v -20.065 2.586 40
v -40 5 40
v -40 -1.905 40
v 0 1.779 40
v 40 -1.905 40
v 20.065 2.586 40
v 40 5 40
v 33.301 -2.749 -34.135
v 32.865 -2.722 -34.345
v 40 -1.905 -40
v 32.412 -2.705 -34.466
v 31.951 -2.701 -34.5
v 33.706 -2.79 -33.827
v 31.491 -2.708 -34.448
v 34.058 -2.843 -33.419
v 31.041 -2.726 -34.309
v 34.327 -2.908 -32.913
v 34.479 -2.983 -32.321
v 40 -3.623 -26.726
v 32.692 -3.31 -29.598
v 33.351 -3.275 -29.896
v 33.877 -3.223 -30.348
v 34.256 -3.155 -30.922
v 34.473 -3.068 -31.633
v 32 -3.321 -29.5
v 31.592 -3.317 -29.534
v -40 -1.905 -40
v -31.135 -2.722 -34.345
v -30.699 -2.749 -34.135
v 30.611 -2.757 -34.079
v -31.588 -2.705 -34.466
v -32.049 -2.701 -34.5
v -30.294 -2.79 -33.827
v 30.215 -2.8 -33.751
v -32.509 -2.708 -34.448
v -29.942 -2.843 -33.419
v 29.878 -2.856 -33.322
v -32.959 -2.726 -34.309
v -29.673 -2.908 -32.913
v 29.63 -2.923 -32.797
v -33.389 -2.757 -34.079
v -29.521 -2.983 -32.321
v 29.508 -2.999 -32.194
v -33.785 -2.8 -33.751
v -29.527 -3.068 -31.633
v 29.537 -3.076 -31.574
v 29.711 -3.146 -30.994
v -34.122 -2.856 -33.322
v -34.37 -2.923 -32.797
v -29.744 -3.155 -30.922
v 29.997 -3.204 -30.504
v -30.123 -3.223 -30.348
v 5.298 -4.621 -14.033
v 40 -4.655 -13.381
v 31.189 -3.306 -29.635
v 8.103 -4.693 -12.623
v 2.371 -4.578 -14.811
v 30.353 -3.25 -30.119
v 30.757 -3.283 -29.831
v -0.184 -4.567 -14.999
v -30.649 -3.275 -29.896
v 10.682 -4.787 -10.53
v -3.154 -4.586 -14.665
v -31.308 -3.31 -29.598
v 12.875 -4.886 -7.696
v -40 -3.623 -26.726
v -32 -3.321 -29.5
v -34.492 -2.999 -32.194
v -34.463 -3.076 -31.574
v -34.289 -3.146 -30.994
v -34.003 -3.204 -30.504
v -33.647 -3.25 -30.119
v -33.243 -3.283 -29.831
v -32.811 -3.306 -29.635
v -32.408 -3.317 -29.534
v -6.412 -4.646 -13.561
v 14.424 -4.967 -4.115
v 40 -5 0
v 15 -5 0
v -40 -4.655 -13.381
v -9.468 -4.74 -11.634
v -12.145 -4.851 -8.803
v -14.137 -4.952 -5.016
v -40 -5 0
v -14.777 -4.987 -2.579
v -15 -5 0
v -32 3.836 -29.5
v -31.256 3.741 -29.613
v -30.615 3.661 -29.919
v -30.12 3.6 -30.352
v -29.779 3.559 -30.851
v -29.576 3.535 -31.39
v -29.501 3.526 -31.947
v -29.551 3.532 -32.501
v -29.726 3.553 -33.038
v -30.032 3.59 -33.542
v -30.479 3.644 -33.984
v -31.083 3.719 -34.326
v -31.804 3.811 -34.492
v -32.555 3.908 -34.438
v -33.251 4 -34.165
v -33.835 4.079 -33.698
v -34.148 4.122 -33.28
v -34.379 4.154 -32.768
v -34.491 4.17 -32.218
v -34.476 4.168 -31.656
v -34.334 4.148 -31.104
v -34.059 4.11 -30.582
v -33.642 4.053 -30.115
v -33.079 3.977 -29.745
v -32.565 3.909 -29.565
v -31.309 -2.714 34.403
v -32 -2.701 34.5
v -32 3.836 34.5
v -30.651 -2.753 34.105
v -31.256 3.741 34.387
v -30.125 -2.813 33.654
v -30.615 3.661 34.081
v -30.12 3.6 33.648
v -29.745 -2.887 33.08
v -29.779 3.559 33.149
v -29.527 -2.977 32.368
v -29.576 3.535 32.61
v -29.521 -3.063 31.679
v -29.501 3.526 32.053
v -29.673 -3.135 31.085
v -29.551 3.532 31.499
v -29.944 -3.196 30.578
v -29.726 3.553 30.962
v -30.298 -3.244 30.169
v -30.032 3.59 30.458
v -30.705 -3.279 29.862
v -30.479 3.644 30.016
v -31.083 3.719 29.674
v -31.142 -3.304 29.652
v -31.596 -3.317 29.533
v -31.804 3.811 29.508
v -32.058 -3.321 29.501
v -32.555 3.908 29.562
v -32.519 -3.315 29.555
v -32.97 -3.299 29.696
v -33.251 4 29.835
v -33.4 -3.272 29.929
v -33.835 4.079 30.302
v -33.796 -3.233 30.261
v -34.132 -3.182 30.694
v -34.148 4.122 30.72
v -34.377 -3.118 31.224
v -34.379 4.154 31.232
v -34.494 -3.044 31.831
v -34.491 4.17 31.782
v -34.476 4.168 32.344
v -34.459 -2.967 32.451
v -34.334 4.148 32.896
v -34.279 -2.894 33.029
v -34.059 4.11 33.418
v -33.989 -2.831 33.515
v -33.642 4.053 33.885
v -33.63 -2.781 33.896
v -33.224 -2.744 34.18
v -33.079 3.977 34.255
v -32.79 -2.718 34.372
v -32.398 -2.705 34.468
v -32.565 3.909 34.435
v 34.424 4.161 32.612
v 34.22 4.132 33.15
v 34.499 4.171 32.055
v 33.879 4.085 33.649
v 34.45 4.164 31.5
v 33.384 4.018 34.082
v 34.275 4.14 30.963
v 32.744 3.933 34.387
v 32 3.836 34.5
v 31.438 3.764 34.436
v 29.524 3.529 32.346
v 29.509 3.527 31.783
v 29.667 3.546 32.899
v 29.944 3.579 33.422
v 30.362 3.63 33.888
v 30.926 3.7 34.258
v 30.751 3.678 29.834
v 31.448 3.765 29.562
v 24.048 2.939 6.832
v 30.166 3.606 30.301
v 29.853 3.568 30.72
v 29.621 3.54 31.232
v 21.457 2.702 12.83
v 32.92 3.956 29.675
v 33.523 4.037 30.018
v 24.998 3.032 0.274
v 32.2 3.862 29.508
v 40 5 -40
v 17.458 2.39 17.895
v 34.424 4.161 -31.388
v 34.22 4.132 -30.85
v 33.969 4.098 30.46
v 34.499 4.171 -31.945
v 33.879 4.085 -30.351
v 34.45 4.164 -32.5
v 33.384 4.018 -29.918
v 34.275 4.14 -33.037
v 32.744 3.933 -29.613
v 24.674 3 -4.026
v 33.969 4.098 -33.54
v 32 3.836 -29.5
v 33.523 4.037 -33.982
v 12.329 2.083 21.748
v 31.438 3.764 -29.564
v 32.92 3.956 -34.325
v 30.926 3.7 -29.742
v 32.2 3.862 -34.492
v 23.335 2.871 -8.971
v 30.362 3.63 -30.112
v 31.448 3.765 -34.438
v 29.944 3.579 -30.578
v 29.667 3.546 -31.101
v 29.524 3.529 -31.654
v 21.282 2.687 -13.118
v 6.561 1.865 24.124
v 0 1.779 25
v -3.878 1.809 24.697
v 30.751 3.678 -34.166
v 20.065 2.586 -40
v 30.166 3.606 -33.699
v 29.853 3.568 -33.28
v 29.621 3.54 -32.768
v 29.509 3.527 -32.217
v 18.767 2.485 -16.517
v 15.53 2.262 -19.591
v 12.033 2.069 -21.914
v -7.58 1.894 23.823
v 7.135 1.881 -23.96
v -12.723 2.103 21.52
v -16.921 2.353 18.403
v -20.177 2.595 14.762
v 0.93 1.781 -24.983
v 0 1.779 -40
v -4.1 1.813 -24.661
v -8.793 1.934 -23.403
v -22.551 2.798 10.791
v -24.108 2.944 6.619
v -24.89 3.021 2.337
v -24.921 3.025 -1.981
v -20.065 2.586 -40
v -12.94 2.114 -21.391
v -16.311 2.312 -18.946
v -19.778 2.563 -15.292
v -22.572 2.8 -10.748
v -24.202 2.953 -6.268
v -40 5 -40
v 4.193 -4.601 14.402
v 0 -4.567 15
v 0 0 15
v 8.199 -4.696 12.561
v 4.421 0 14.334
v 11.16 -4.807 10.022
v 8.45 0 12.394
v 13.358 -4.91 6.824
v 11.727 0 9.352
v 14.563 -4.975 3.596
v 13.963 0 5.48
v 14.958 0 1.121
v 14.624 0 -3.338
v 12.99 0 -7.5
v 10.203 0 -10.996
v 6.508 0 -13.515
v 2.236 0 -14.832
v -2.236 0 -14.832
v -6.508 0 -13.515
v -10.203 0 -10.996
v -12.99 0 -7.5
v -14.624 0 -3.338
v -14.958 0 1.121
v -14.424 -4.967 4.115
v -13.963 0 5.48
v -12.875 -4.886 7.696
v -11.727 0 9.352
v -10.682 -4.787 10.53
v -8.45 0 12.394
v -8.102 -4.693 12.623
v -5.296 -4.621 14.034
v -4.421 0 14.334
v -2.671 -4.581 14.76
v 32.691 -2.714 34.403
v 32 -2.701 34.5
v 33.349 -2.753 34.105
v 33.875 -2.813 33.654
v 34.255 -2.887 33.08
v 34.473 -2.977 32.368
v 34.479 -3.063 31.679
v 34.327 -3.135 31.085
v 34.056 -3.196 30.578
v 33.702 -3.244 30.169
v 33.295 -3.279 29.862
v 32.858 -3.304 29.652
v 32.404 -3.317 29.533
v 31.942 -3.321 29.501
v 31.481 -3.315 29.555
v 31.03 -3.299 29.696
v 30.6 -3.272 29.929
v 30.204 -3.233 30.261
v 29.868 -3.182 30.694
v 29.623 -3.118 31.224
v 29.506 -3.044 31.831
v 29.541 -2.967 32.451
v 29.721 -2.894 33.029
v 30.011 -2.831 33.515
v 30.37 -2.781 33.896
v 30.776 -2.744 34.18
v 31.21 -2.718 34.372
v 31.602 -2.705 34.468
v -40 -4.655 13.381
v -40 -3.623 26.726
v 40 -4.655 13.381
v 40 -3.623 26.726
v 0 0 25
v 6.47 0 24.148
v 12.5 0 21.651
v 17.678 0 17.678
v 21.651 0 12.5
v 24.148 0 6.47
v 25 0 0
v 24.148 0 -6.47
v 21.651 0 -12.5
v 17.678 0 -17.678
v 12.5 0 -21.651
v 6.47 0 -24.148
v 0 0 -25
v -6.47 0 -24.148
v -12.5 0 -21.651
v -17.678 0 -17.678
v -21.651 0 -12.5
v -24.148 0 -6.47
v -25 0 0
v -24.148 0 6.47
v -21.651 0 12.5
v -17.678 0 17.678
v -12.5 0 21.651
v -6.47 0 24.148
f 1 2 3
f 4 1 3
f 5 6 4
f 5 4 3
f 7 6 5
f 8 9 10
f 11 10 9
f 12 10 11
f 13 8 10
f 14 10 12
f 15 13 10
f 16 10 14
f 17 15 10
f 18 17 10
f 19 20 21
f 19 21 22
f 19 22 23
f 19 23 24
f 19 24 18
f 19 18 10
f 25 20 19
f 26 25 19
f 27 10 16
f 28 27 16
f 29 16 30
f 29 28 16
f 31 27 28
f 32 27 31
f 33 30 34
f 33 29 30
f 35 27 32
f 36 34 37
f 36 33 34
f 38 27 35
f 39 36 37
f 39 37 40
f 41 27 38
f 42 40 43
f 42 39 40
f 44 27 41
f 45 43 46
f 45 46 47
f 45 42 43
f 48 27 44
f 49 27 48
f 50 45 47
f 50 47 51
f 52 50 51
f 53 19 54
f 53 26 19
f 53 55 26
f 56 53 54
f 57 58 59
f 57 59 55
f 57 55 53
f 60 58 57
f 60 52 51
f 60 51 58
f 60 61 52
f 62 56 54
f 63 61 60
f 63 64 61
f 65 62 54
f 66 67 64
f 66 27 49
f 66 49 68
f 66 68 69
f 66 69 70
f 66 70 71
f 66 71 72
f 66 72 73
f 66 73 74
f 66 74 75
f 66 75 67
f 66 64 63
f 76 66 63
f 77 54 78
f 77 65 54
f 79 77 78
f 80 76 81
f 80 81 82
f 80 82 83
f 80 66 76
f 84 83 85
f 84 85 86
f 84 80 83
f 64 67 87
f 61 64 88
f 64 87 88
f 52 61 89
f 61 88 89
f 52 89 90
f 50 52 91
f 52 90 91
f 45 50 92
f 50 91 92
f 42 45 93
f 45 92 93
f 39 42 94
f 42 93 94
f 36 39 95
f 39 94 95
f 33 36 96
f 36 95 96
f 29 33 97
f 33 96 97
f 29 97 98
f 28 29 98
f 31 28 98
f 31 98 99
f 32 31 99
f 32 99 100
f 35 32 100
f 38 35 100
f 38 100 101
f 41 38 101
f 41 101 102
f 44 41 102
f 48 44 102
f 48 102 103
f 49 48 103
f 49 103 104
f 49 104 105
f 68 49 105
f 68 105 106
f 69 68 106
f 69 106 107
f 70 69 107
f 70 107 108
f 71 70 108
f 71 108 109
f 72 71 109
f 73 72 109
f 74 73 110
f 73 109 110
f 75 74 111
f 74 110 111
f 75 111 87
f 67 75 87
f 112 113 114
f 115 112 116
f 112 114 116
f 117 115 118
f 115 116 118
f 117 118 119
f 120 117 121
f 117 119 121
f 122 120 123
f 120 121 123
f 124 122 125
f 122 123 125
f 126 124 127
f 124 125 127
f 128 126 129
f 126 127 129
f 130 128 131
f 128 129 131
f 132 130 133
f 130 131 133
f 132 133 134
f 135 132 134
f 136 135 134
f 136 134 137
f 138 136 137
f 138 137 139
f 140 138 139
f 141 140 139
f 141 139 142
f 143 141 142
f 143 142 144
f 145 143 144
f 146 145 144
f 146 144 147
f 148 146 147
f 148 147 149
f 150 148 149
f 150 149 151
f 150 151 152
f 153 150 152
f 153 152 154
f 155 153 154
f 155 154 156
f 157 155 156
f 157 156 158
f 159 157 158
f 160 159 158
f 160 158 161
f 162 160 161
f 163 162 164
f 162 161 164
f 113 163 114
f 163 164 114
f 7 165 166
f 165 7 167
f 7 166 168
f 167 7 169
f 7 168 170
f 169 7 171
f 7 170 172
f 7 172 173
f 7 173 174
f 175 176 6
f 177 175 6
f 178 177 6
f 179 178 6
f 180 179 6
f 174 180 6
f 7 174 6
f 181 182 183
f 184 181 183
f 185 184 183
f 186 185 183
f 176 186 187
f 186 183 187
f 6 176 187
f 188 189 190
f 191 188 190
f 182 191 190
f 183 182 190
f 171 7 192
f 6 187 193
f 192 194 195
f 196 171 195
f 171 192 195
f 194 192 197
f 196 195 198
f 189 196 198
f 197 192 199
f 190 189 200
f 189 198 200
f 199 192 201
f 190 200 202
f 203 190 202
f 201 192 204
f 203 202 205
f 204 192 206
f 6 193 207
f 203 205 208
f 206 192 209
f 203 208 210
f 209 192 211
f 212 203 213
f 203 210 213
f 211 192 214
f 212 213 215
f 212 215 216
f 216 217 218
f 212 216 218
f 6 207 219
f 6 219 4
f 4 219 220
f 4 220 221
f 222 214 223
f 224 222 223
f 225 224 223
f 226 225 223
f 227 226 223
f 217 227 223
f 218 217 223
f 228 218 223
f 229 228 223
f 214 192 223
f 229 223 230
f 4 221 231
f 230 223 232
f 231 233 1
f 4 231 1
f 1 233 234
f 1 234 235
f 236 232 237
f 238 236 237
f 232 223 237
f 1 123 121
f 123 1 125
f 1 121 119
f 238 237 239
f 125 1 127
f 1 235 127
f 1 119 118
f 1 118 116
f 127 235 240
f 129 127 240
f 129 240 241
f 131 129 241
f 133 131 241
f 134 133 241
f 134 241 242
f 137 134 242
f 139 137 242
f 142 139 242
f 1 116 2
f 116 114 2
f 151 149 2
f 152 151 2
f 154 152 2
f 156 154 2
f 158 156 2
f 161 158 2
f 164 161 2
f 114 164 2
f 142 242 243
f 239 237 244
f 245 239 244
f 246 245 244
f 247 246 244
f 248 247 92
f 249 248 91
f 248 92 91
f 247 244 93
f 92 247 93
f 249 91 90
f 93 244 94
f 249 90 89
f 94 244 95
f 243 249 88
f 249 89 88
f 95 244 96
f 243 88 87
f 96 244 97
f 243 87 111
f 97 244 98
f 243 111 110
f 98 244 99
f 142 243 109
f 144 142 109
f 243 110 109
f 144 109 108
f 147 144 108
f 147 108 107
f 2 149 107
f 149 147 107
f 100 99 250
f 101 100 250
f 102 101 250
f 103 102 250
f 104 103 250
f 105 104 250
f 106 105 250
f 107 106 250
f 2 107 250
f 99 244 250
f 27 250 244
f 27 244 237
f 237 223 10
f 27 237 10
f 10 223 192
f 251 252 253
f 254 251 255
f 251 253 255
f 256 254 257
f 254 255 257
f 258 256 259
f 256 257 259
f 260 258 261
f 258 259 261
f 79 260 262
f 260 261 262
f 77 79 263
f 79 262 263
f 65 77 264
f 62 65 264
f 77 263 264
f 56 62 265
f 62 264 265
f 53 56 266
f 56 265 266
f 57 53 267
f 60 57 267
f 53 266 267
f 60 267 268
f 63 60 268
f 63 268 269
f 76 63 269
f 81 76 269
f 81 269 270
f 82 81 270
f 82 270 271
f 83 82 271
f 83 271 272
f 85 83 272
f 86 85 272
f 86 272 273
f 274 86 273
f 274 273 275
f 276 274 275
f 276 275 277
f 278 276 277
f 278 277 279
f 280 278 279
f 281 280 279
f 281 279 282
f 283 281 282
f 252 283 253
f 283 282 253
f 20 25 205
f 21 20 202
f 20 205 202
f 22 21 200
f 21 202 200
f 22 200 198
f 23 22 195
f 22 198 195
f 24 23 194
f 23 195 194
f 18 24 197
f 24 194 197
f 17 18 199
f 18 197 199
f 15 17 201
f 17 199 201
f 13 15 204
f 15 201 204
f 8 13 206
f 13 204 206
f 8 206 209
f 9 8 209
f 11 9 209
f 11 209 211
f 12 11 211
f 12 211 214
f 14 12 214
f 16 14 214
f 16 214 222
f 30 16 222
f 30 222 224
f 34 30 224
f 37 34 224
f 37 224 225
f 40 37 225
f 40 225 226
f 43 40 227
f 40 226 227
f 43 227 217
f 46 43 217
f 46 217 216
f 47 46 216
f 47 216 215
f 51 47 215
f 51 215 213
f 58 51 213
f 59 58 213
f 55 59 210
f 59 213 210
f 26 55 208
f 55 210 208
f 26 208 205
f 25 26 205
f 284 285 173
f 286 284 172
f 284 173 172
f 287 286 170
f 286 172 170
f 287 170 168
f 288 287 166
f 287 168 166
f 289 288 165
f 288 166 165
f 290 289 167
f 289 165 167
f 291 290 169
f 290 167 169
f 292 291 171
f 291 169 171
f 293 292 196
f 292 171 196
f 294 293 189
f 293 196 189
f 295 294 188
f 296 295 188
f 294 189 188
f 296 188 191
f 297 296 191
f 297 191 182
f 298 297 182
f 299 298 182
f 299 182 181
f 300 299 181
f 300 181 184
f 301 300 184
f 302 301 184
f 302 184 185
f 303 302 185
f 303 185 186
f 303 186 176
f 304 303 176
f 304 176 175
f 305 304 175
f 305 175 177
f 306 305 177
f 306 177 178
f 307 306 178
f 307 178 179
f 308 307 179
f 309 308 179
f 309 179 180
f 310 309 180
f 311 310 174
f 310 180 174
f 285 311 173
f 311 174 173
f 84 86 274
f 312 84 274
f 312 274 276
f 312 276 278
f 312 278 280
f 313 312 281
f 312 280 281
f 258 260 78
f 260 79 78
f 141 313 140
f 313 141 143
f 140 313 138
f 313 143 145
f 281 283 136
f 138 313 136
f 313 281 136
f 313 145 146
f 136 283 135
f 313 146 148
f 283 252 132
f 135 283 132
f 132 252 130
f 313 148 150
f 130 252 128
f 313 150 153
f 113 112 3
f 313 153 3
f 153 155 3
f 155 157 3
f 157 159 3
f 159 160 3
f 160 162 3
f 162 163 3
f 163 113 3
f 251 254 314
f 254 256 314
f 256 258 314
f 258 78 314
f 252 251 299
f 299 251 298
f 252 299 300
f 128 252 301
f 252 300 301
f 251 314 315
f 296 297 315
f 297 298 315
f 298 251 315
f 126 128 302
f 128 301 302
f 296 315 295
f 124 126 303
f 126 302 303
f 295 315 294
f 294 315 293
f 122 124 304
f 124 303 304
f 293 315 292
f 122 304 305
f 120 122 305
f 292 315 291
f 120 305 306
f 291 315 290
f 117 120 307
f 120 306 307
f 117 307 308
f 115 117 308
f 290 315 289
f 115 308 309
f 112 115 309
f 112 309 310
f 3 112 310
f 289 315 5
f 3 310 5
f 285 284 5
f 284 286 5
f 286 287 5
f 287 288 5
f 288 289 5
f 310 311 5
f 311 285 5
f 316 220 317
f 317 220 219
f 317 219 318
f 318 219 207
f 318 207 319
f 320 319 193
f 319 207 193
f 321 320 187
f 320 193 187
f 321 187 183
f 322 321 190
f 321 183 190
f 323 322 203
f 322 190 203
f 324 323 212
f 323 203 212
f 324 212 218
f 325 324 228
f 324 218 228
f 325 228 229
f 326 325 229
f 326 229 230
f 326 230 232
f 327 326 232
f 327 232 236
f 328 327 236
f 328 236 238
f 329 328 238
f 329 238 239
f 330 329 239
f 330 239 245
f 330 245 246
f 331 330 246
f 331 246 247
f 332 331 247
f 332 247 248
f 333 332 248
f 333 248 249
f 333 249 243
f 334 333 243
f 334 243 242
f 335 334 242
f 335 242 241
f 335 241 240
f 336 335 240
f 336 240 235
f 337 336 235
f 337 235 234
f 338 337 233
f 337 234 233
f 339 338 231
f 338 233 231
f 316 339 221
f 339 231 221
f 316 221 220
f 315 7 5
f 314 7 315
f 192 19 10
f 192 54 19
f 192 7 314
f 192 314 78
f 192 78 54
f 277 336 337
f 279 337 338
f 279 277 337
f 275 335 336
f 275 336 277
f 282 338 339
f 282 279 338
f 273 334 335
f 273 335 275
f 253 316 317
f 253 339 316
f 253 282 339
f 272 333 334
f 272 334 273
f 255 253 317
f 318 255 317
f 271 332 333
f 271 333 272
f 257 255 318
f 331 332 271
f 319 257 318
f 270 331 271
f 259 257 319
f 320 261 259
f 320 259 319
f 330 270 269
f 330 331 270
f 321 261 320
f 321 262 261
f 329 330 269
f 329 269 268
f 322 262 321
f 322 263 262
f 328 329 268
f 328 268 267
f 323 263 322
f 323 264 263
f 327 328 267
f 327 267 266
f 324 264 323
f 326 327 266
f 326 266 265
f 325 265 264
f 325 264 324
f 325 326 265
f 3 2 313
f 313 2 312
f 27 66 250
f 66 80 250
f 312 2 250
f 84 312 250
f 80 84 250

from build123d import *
from build123d.topology import SkipClean

# Parameters (mm, degrees)
SKETCH1_3_W         = 80
SKETCH1_3_H         = 80
SKETCH1_3_R         = 2.5
SKETCH1_3_R_2       = 15
BOSS_EXTRUDE3_DEPTH = 5
BOSS_EXTRUDE4_START = 5
SKETCH1_W           = 80
SKETCH1_H           = 80
SKETCH1_R           = 2.5
SKETCH1_R_2         = 25
BOSS_EXTRUDE4_DEPTH = 5
CUT_EXTRUDE1_DEPTH  = 90.582364336
CUT_EXTRUDE2_DEPTH  = 90.582364475
CUT_EXTRUDE3_DEPTH  = 90.582364475


with BuildPart() as part:
    # Sketch1<3> → Boss-Extrude3 (new body)
    with BuildSketch(Plane(origin=(0, 0, 0), x_dir=(1, 0, 0), z_dir=(0, 1, 0))):
        Rectangle(SKETCH1_3_W, SKETCH1_3_H)
        with Locations((-32, -32)):
            Circle(SKETCH1_3_R, mode=Mode.SUBTRACT)
        with Locations((32, -32)):
            Circle(SKETCH1_3_R, mode=Mode.SUBTRACT)
        with Locations((-32, 32)):
            Circle(SKETCH1_3_R, mode=Mode.SUBTRACT)
        with Locations((32, 32)):
            Circle(SKETCH1_3_R, mode=Mode.SUBTRACT)
        Circle(SKETCH1_3_R_2, mode=Mode.SUBTRACT)
    extrude(amount=-BOSS_EXTRUDE3_DEPTH)

    # Sketch1 → Boss-Extrude4 (add)
    with BuildSketch(Plane(origin=(0, 0, 0), x_dir=(1, 0, 0), z_dir=(0, 1, 0)).offset(BOSS_EXTRUDE4_START)):
        Rectangle(SKETCH1_W, SKETCH1_H)
        with Locations((-32, -32)):
            Circle(SKETCH1_R, mode=Mode.SUBTRACT)
        with Locations((32, -32)):
            Circle(SKETCH1_R, mode=Mode.SUBTRACT)
        Circle(SKETCH1_R_2, mode=Mode.SUBTRACT)
        with Locations((-32, 32)):
            Circle(SKETCH1_R, mode=Mode.SUBTRACT)
        with Locations((32, 32)):
            Circle(SKETCH1_R, mode=Mode.SUBTRACT)
    extrude(amount=-BOSS_EXTRUDE4_DEPTH)

    # Sketch5 → Cut-Extrude1 (cut, through all)
    with BuildSketch(Plane(origin=(0, 0, -40), x_dir=(-1, 0, 0), z_dir=(0, 0, -1))):
        with BuildLine():
            Line((40, 5), (-40, 5))
            ThreePointArc((-40, 5), (0, 1.779253585), (40, 5))
        make_face()
    extrude(amount=-CUT_EXTRUDE1_DEPTH, mode=Mode.SUBTRACT)

    # Sketch7 → Cut-Extrude2 (cut, through all)
    with BuildSketch(Plane(origin=(40, 0, 0), x_dir=(0, 0, -1), z_dir=(1, 0, 0))):
        with BuildLine():
            ThreePointArc((0, -5), (-20.059793007, -4.225007869), (-40, -1.904651573))
            Line((-40, -1.904651573), (-40, -5))
            Line((-40, -5), (0, -5))
        make_face()
    extrude(amount=-CUT_EXTRUDE2_DEPTH, mode=Mode.SUBTRACT)

    # Sketch7<3> → Cut-Extrude3 (cut, through all)
    with SkipClean():  # the faces are left unmerged after this step: merging them gives an invalid solid
        with BuildSketch(Plane(origin=(40, 0, 0), x_dir=(0, 0, -1), z_dir=(1, 0, 0))):
            with BuildLine():
                ThreePointArc((40, -1.904651573), (20.059793007, -4.225007869), (0, -5))
                Line((0, -5), (40, -5))
                Line((40, -5), (40, -1.904651573))
            make_face()
        extrude(amount=-CUT_EXTRUDE3_DEPTH, mode=Mode.SUBTRACT)


solid = part.part
